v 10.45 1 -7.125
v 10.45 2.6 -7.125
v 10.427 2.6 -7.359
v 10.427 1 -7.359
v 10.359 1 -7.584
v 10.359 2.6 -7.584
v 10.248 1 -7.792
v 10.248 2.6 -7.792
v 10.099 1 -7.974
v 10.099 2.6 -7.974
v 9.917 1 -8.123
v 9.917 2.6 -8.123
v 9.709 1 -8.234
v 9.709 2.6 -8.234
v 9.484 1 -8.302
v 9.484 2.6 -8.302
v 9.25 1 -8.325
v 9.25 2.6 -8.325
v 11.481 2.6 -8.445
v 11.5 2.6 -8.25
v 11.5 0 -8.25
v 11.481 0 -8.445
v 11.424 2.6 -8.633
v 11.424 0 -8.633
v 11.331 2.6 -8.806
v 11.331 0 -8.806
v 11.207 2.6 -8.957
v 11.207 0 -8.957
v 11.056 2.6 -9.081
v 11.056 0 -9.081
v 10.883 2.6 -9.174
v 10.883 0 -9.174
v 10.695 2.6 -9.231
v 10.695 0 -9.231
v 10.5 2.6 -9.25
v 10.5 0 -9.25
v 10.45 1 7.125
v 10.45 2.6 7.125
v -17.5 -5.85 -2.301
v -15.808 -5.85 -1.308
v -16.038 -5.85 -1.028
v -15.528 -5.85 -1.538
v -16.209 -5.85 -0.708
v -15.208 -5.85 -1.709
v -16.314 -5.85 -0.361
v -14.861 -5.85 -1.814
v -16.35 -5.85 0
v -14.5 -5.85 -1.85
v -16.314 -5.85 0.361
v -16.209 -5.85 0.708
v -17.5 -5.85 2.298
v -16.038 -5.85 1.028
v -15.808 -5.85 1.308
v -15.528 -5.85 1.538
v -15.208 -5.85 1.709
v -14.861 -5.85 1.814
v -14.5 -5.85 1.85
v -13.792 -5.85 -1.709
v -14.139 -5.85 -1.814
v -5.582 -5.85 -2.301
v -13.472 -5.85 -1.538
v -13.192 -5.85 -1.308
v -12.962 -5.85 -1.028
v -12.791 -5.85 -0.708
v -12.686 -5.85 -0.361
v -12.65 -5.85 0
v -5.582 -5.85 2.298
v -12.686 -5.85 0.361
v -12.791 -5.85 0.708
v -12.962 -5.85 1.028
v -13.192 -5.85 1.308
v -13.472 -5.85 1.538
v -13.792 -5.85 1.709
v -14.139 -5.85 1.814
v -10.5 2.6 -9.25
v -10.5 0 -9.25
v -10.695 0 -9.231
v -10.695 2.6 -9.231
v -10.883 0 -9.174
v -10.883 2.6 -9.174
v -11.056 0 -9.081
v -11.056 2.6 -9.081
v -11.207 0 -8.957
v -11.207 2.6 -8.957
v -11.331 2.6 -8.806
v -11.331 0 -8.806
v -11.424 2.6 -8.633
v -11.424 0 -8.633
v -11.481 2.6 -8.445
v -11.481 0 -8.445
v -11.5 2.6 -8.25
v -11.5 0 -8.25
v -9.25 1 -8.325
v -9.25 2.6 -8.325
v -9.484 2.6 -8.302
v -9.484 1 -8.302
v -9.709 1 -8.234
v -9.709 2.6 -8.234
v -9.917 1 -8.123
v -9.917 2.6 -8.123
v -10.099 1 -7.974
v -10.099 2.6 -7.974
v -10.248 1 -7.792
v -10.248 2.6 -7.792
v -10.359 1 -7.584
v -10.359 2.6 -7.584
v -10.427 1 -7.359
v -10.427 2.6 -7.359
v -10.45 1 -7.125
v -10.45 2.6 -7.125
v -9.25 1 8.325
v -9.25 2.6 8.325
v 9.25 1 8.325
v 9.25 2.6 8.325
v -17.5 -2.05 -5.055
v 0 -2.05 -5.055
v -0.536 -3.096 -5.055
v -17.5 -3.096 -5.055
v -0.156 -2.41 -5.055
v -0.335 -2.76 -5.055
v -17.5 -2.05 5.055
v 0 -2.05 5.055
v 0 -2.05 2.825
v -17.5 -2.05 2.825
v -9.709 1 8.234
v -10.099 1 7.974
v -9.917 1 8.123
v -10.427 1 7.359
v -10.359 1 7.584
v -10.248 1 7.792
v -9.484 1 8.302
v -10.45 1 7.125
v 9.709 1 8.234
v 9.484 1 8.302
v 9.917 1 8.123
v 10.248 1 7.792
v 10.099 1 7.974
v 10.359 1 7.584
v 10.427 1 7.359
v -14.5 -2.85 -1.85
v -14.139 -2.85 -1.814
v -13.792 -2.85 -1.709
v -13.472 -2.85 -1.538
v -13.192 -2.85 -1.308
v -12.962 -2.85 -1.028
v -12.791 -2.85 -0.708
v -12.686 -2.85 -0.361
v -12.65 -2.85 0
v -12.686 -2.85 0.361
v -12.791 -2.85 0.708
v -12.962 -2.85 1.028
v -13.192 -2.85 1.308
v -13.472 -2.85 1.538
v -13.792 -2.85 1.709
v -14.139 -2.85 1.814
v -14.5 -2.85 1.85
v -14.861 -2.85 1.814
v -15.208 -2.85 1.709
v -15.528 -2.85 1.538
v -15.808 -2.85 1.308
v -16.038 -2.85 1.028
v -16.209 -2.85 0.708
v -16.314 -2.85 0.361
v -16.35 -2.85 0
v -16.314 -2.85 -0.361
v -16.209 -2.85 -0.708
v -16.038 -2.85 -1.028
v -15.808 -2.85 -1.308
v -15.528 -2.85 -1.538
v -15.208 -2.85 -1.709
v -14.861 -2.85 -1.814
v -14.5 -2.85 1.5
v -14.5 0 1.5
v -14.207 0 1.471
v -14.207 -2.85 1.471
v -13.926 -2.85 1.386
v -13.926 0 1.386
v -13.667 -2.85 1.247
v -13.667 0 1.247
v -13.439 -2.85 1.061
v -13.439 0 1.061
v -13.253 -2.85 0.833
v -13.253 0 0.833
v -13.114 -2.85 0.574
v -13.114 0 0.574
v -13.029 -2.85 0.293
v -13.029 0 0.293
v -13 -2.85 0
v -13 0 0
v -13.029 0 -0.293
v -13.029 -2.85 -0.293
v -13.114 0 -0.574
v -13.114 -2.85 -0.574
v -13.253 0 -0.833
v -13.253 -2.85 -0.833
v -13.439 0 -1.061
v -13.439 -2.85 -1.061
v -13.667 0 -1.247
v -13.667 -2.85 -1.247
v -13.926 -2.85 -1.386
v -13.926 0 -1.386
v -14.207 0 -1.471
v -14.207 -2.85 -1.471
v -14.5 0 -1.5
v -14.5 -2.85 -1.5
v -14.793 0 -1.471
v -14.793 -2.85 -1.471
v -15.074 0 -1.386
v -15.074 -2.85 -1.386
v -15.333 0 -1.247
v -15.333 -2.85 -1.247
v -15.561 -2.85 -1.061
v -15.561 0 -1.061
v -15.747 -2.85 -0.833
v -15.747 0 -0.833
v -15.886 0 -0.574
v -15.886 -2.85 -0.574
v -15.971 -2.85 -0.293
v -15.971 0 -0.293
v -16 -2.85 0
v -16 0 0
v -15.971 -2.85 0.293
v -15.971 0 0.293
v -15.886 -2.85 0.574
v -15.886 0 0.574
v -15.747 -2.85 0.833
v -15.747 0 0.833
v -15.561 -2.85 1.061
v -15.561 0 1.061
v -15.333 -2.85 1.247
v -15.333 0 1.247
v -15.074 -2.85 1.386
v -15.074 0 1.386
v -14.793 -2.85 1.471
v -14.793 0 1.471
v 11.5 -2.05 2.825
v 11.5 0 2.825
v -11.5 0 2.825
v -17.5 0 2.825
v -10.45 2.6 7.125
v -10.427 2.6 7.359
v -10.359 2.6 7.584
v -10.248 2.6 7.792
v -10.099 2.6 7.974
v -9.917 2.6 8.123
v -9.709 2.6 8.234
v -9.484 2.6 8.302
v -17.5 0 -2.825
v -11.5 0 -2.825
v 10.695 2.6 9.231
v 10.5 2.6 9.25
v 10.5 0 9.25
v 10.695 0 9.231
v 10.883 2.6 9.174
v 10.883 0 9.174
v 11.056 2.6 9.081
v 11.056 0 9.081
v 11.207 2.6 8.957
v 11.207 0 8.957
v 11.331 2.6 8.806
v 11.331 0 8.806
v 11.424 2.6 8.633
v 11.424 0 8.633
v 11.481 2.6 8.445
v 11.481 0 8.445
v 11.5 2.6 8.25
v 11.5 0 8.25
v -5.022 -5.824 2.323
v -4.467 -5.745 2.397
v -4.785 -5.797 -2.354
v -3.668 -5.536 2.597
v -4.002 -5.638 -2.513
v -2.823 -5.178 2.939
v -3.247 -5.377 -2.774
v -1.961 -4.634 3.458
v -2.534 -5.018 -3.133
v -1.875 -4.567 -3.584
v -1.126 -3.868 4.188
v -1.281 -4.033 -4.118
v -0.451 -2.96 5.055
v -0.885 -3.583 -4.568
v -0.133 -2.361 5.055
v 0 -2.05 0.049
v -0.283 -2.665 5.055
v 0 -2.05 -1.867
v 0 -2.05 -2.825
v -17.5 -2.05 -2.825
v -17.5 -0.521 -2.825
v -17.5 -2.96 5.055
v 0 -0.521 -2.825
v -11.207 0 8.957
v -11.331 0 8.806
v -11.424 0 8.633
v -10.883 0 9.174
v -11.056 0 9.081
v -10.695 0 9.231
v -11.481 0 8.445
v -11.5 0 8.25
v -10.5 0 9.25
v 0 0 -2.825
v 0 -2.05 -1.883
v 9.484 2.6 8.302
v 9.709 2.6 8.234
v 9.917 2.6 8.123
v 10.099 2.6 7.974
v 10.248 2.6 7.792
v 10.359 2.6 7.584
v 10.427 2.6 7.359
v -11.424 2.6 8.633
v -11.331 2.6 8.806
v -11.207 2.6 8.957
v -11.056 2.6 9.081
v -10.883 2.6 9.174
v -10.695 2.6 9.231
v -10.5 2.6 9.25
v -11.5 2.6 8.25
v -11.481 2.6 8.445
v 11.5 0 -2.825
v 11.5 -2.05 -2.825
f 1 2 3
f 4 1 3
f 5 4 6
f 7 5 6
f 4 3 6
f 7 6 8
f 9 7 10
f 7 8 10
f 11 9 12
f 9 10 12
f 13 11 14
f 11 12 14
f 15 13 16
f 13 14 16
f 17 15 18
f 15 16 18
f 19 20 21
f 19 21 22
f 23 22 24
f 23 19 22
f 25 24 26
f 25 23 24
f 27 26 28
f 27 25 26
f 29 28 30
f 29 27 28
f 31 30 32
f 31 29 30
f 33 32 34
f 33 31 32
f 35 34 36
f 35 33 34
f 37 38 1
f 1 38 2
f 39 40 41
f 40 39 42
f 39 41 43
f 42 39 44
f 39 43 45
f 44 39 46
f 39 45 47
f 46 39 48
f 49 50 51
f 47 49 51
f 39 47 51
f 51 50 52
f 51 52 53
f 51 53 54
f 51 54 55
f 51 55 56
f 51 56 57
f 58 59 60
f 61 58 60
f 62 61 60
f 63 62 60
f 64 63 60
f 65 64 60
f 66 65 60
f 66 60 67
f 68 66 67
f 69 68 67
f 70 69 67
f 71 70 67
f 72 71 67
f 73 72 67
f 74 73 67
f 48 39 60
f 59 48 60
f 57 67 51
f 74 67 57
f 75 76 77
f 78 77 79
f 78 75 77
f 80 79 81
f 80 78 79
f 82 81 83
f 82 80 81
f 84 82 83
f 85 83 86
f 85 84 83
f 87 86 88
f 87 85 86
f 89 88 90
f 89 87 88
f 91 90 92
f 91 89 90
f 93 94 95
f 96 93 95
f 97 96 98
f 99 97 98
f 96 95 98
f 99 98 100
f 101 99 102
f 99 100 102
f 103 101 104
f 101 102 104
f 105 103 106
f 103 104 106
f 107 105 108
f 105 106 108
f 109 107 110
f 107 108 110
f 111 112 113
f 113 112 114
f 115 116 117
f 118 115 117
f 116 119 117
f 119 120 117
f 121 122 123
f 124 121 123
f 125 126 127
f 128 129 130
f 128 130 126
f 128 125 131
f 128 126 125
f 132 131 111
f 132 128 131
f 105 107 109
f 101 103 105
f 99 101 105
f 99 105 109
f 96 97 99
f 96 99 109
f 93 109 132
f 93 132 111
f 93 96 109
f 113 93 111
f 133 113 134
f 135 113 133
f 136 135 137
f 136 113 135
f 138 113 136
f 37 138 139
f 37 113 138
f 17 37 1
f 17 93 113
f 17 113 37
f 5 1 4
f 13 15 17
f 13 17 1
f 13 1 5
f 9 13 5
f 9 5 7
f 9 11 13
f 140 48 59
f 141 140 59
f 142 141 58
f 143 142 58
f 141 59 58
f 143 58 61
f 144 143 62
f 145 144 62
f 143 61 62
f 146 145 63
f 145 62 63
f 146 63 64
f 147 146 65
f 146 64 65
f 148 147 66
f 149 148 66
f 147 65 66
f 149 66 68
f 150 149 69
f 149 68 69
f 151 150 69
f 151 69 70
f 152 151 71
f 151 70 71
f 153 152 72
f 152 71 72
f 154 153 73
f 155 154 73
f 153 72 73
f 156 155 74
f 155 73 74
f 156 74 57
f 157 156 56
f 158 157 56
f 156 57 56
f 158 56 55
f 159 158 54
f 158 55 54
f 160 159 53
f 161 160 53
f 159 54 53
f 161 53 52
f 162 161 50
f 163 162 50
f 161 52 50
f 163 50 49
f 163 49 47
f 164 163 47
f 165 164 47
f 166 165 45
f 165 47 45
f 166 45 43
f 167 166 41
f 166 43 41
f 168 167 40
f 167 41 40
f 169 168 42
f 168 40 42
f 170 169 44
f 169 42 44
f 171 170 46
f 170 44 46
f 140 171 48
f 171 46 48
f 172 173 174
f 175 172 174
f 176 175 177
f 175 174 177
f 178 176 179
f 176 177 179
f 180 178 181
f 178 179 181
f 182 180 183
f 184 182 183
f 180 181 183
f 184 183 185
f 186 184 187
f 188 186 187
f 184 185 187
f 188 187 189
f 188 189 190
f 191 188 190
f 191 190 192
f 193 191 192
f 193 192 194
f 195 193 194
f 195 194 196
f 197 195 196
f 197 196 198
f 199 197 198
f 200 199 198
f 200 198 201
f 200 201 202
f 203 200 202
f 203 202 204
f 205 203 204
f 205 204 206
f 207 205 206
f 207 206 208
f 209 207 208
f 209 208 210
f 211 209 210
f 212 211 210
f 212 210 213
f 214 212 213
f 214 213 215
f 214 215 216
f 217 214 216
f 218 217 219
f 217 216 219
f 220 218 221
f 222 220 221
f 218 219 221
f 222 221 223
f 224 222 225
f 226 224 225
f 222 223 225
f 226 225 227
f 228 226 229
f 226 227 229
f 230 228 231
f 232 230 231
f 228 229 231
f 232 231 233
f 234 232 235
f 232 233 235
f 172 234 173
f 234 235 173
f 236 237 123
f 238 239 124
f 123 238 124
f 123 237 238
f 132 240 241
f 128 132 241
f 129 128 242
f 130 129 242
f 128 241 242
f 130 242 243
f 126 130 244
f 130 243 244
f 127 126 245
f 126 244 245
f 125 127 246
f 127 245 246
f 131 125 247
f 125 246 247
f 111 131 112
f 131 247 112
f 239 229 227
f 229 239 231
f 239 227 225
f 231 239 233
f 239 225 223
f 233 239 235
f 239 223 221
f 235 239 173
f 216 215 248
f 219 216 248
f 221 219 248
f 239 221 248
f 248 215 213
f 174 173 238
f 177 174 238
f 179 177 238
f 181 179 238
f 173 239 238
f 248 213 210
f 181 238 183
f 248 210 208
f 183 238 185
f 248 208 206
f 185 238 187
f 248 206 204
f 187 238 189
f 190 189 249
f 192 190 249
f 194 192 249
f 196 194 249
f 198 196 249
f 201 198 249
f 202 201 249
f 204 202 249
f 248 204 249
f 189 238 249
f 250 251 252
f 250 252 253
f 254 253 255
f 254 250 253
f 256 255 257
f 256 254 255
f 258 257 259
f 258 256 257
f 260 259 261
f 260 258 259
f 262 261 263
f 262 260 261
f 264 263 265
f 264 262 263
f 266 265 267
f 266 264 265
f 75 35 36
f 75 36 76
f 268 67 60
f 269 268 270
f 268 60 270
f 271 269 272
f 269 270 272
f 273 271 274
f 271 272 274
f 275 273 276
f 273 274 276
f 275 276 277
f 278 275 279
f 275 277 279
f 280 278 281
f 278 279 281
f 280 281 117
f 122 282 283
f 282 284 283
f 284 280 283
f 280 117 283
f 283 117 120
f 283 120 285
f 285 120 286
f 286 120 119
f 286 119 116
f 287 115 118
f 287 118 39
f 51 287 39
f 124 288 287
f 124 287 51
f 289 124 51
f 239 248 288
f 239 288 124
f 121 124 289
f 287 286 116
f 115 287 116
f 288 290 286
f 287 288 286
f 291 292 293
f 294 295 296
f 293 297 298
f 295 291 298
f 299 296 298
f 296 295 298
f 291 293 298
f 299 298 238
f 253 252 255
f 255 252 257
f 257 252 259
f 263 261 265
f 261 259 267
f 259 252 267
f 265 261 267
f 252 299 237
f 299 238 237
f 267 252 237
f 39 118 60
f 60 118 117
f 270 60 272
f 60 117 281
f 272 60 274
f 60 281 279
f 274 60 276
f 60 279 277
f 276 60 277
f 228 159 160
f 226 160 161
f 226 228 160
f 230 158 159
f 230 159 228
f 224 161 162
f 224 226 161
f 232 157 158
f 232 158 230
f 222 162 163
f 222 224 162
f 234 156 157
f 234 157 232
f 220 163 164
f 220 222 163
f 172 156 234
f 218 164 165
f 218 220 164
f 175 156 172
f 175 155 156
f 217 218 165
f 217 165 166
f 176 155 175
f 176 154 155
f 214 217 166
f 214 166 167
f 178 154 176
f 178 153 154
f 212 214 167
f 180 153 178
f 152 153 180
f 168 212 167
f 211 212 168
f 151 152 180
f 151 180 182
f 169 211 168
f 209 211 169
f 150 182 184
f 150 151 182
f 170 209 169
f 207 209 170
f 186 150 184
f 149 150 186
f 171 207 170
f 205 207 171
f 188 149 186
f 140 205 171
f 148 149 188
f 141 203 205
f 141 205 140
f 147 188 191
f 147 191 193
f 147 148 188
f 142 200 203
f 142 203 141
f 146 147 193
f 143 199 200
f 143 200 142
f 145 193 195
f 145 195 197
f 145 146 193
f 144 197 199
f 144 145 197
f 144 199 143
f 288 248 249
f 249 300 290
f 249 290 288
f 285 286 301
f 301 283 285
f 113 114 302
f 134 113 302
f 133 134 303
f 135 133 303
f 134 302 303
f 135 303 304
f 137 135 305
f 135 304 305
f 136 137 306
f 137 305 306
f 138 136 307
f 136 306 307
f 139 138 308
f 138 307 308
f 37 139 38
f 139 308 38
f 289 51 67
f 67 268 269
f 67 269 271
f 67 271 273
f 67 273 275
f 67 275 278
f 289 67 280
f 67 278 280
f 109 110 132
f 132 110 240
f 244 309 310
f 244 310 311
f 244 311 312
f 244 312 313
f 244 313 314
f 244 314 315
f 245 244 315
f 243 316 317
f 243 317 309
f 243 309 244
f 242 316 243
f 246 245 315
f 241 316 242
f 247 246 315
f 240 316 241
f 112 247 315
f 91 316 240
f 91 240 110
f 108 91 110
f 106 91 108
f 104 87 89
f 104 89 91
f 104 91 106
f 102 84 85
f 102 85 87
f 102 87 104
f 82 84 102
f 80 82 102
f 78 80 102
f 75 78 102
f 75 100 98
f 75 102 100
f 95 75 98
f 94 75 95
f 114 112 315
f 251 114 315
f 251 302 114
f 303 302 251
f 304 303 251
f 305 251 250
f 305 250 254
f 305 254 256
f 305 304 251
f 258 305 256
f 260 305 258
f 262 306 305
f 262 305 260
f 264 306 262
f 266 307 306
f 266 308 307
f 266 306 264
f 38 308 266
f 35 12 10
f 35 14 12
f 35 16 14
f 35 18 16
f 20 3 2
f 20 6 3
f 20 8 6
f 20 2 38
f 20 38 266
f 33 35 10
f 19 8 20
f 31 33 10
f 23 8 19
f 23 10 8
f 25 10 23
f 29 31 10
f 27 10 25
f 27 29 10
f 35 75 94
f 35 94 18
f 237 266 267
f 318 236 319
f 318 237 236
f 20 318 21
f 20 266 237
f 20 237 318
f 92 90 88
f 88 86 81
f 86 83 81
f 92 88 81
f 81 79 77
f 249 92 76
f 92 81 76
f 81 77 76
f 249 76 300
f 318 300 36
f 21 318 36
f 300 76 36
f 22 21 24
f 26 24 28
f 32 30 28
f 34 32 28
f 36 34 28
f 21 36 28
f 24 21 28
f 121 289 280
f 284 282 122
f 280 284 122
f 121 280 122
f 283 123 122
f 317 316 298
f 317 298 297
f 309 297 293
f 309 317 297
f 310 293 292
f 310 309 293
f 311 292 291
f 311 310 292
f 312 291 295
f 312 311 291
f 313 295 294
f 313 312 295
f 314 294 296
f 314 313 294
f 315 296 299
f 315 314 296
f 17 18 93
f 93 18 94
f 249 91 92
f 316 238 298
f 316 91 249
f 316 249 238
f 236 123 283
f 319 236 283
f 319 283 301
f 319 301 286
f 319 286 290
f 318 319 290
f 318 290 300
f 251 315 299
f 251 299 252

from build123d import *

# Parameters (mm, degrees)
SKETCH1_W           = 23
SKETCH1_H           = 18.5
BOSS_EXTRUDE1_DEPTH = 1
FILLET1_R           = 1
BOSS_EXTRUDE2_START = 1.6
BOSS_EXTRUDE2_DEPTH = 1.6
BOSS_EXTRUDE3_DEPTH = 17.5
BOSS_EXTRUDE4_DEPTH = 11.5
FILLET2_R           = 6
SKETCH5_R           = 1.5
CUT_EXTRUDE1_DEPTH  = 9
SKETCH6_R           = 1.85
CUT_EXTRUDE3_DEPTH  = 3


with BuildPart() as part:
    # Sketch1 → Boss-Extrude1 (new body)
    with BuildSketch(Plane(origin=(0, 0, 0), x_dir=(1, 0, 0), z_dir=(0, 1, 0))):
        Rectangle(SKETCH1_W, SKETCH1_H)
    extrude(amount=BOSS_EXTRUDE1_DEPTH)

    # Fillet1
    fillet1_edges = [part.edges().sort_by_distance(p)[0] for p in [
        (11.5, 0.5, 9.25),
        (-11.5, 0.5, 9.25),
        (-11.5, 0.5, -9.25),
        (11.5, 0.5, -9.25),
    ]]
    fillet(fillet1_edges, radius=FILLET1_R)

    # Sketch2 → Boss-Extrude2 (add)
    with BuildSketch(Plane(origin=(0, 1, 0), x_dir=(1, 0, 0), z_dir=(0, 1, 0)).offset(BOSS_EXTRUDE2_START)):
        with BuildLine():
            Line((10.5, 9.25), (-10.5, 9.25))
            ThreePointArc((-10.5, 9.25), (-11.207106781, 8.957106781), (-11.5, 8.25))
            Line((-11.5, 8.25), (-11.5, -8.25))
            ThreePointArc((-11.5, -8.25), (-11.207106781, -8.957106781), (-10.5, -9.25))
            Line((-10.5, -9.25), (10.5, -9.25))
            ThreePointArc((10.5, -9.25), (11.207106781, -8.957106781), (11.5, -8.25))
            Line((11.5, -8.25), (11.5, 8.25))
            ThreePointArc((11.5, 8.25), (11.207106781, 8.957106781), (10.5, 9.25))
        make_face()
        with BuildLine():
            Line((9.25, 8.325), (-9.25, 8.325))
            ThreePointArc((-9.25, 8.325), (-10.098528137, 7.973528137), (-10.45, 7.125))
            Line((-10.45, 7.125), (-10.45, -7.125))
            ThreePointArc((-10.45, -7.125), (-10.098528137, -7.973528137), (-9.25, -8.325))
            Line((-9.25, -8.325), (9.25, -8.325))
            ThreePointArc((9.25, -8.325), (10.098528137, -7.973528137), (10.45, -7.125))
            Line((10.45, -7.125), (10.45, 7.125))
            ThreePointArc((10.45, 7.125), (10.098528137, 7.973528137), (9.25, 8.325))
        make_face(mode=Mode.SUBTRACT)
    extrude(amount=-BOSS_EXTRUDE2_DEPTH)

    # Sketch3 → Boss-Extrude3 (add)
    with BuildSketch(Plane(origin=(0, 0, 0), x_dir=(0, 0, -1), z_dir=(1, 0, 0))):
        Polygon((-2.824998215, -0.434236645), (-2.824998215, 0), (2.825004114, 0), (2.825004114, -0.52086856), (2.825004485, -2.050001378), (5.054655907, -2.050000837), (5.054655907, -3.096446609), (2.301102516, -5.85), (-2.297621726, -5.85), (-5.054652336, -2.959512633), (-5.054652336, -2.05), (-2.824998215, -2.05), align=None)
    extrude(amount=-BOSS_EXTRUDE3_DEPTH)

    # Sketch4 → Boss-Extrude4 (add)
    with BuildSketch(Plane(origin=(0, 0, 0), x_dir=(0, 0, -1), z_dir=(1, 0, 0))):
        Polygon((-2.824998215, -2.05), (2.825004485, -2.050001378), (2.825004114, 0), (-2.824998215, 0), align=None)
    extrude(amount=BOSS_EXTRUDE4_DEPTH)

    # Fillet2
    # the kernel refuses this fillet: 6 mm, written as the material it takes off along each edge
    with BuildSketch(Plane(origin=(0, -5.85, -16.256387574), x_dir=(0, 1, 0), z_dir=(0, 0, 1))) as fillet2_piece_1:
        with BuildLine():
            CenterArc((6, 5.582114023), FILLET2_R, 180, 68.489804657)
            Line((0, 5.582114023), (-0.12, 5.582114023))
            Line((-0.12, 5.582114023), (-0.12, 0))
            Line((-0.12, 0), (0, -0.12))
            ThreePointArc((0, -0.12), (1.899999655, -0.12), (3.755999297, -0.11164228))
            Line((3.755999297, -0.11164228), (3.799999311, 0))
        make_face()
    extrude(amount=32.509294358, mode=Mode.SUBTRACT)

    # Sketch5 → Cut-Extrude1 (cut)
    with BuildSketch(Plane(origin=(0, 0, 0), x_dir=(1, 0, 0), z_dir=(0, 1, 0))):
        with Locations(Location((-14.5, 0, 0), (0, 0, 270))):
            Circle(SKETCH5_R)
    extrude(amount=-CUT_EXTRUDE1_DEPTH, mode=Mode.SUBTRACT)

    # Sketch6 → Cut-Extrude3 (cut)
    with BuildSketch(Plane.XZ.offset(5.85)):
        with Locations(Location((-14.5, 0, 0), (0, 0, 270))):
            Circle(SKETCH6_R)
    extrude(amount=-CUT_EXTRUDE3_DEPTH, mode=Mode.SUBTRACT)


solid = part.part
